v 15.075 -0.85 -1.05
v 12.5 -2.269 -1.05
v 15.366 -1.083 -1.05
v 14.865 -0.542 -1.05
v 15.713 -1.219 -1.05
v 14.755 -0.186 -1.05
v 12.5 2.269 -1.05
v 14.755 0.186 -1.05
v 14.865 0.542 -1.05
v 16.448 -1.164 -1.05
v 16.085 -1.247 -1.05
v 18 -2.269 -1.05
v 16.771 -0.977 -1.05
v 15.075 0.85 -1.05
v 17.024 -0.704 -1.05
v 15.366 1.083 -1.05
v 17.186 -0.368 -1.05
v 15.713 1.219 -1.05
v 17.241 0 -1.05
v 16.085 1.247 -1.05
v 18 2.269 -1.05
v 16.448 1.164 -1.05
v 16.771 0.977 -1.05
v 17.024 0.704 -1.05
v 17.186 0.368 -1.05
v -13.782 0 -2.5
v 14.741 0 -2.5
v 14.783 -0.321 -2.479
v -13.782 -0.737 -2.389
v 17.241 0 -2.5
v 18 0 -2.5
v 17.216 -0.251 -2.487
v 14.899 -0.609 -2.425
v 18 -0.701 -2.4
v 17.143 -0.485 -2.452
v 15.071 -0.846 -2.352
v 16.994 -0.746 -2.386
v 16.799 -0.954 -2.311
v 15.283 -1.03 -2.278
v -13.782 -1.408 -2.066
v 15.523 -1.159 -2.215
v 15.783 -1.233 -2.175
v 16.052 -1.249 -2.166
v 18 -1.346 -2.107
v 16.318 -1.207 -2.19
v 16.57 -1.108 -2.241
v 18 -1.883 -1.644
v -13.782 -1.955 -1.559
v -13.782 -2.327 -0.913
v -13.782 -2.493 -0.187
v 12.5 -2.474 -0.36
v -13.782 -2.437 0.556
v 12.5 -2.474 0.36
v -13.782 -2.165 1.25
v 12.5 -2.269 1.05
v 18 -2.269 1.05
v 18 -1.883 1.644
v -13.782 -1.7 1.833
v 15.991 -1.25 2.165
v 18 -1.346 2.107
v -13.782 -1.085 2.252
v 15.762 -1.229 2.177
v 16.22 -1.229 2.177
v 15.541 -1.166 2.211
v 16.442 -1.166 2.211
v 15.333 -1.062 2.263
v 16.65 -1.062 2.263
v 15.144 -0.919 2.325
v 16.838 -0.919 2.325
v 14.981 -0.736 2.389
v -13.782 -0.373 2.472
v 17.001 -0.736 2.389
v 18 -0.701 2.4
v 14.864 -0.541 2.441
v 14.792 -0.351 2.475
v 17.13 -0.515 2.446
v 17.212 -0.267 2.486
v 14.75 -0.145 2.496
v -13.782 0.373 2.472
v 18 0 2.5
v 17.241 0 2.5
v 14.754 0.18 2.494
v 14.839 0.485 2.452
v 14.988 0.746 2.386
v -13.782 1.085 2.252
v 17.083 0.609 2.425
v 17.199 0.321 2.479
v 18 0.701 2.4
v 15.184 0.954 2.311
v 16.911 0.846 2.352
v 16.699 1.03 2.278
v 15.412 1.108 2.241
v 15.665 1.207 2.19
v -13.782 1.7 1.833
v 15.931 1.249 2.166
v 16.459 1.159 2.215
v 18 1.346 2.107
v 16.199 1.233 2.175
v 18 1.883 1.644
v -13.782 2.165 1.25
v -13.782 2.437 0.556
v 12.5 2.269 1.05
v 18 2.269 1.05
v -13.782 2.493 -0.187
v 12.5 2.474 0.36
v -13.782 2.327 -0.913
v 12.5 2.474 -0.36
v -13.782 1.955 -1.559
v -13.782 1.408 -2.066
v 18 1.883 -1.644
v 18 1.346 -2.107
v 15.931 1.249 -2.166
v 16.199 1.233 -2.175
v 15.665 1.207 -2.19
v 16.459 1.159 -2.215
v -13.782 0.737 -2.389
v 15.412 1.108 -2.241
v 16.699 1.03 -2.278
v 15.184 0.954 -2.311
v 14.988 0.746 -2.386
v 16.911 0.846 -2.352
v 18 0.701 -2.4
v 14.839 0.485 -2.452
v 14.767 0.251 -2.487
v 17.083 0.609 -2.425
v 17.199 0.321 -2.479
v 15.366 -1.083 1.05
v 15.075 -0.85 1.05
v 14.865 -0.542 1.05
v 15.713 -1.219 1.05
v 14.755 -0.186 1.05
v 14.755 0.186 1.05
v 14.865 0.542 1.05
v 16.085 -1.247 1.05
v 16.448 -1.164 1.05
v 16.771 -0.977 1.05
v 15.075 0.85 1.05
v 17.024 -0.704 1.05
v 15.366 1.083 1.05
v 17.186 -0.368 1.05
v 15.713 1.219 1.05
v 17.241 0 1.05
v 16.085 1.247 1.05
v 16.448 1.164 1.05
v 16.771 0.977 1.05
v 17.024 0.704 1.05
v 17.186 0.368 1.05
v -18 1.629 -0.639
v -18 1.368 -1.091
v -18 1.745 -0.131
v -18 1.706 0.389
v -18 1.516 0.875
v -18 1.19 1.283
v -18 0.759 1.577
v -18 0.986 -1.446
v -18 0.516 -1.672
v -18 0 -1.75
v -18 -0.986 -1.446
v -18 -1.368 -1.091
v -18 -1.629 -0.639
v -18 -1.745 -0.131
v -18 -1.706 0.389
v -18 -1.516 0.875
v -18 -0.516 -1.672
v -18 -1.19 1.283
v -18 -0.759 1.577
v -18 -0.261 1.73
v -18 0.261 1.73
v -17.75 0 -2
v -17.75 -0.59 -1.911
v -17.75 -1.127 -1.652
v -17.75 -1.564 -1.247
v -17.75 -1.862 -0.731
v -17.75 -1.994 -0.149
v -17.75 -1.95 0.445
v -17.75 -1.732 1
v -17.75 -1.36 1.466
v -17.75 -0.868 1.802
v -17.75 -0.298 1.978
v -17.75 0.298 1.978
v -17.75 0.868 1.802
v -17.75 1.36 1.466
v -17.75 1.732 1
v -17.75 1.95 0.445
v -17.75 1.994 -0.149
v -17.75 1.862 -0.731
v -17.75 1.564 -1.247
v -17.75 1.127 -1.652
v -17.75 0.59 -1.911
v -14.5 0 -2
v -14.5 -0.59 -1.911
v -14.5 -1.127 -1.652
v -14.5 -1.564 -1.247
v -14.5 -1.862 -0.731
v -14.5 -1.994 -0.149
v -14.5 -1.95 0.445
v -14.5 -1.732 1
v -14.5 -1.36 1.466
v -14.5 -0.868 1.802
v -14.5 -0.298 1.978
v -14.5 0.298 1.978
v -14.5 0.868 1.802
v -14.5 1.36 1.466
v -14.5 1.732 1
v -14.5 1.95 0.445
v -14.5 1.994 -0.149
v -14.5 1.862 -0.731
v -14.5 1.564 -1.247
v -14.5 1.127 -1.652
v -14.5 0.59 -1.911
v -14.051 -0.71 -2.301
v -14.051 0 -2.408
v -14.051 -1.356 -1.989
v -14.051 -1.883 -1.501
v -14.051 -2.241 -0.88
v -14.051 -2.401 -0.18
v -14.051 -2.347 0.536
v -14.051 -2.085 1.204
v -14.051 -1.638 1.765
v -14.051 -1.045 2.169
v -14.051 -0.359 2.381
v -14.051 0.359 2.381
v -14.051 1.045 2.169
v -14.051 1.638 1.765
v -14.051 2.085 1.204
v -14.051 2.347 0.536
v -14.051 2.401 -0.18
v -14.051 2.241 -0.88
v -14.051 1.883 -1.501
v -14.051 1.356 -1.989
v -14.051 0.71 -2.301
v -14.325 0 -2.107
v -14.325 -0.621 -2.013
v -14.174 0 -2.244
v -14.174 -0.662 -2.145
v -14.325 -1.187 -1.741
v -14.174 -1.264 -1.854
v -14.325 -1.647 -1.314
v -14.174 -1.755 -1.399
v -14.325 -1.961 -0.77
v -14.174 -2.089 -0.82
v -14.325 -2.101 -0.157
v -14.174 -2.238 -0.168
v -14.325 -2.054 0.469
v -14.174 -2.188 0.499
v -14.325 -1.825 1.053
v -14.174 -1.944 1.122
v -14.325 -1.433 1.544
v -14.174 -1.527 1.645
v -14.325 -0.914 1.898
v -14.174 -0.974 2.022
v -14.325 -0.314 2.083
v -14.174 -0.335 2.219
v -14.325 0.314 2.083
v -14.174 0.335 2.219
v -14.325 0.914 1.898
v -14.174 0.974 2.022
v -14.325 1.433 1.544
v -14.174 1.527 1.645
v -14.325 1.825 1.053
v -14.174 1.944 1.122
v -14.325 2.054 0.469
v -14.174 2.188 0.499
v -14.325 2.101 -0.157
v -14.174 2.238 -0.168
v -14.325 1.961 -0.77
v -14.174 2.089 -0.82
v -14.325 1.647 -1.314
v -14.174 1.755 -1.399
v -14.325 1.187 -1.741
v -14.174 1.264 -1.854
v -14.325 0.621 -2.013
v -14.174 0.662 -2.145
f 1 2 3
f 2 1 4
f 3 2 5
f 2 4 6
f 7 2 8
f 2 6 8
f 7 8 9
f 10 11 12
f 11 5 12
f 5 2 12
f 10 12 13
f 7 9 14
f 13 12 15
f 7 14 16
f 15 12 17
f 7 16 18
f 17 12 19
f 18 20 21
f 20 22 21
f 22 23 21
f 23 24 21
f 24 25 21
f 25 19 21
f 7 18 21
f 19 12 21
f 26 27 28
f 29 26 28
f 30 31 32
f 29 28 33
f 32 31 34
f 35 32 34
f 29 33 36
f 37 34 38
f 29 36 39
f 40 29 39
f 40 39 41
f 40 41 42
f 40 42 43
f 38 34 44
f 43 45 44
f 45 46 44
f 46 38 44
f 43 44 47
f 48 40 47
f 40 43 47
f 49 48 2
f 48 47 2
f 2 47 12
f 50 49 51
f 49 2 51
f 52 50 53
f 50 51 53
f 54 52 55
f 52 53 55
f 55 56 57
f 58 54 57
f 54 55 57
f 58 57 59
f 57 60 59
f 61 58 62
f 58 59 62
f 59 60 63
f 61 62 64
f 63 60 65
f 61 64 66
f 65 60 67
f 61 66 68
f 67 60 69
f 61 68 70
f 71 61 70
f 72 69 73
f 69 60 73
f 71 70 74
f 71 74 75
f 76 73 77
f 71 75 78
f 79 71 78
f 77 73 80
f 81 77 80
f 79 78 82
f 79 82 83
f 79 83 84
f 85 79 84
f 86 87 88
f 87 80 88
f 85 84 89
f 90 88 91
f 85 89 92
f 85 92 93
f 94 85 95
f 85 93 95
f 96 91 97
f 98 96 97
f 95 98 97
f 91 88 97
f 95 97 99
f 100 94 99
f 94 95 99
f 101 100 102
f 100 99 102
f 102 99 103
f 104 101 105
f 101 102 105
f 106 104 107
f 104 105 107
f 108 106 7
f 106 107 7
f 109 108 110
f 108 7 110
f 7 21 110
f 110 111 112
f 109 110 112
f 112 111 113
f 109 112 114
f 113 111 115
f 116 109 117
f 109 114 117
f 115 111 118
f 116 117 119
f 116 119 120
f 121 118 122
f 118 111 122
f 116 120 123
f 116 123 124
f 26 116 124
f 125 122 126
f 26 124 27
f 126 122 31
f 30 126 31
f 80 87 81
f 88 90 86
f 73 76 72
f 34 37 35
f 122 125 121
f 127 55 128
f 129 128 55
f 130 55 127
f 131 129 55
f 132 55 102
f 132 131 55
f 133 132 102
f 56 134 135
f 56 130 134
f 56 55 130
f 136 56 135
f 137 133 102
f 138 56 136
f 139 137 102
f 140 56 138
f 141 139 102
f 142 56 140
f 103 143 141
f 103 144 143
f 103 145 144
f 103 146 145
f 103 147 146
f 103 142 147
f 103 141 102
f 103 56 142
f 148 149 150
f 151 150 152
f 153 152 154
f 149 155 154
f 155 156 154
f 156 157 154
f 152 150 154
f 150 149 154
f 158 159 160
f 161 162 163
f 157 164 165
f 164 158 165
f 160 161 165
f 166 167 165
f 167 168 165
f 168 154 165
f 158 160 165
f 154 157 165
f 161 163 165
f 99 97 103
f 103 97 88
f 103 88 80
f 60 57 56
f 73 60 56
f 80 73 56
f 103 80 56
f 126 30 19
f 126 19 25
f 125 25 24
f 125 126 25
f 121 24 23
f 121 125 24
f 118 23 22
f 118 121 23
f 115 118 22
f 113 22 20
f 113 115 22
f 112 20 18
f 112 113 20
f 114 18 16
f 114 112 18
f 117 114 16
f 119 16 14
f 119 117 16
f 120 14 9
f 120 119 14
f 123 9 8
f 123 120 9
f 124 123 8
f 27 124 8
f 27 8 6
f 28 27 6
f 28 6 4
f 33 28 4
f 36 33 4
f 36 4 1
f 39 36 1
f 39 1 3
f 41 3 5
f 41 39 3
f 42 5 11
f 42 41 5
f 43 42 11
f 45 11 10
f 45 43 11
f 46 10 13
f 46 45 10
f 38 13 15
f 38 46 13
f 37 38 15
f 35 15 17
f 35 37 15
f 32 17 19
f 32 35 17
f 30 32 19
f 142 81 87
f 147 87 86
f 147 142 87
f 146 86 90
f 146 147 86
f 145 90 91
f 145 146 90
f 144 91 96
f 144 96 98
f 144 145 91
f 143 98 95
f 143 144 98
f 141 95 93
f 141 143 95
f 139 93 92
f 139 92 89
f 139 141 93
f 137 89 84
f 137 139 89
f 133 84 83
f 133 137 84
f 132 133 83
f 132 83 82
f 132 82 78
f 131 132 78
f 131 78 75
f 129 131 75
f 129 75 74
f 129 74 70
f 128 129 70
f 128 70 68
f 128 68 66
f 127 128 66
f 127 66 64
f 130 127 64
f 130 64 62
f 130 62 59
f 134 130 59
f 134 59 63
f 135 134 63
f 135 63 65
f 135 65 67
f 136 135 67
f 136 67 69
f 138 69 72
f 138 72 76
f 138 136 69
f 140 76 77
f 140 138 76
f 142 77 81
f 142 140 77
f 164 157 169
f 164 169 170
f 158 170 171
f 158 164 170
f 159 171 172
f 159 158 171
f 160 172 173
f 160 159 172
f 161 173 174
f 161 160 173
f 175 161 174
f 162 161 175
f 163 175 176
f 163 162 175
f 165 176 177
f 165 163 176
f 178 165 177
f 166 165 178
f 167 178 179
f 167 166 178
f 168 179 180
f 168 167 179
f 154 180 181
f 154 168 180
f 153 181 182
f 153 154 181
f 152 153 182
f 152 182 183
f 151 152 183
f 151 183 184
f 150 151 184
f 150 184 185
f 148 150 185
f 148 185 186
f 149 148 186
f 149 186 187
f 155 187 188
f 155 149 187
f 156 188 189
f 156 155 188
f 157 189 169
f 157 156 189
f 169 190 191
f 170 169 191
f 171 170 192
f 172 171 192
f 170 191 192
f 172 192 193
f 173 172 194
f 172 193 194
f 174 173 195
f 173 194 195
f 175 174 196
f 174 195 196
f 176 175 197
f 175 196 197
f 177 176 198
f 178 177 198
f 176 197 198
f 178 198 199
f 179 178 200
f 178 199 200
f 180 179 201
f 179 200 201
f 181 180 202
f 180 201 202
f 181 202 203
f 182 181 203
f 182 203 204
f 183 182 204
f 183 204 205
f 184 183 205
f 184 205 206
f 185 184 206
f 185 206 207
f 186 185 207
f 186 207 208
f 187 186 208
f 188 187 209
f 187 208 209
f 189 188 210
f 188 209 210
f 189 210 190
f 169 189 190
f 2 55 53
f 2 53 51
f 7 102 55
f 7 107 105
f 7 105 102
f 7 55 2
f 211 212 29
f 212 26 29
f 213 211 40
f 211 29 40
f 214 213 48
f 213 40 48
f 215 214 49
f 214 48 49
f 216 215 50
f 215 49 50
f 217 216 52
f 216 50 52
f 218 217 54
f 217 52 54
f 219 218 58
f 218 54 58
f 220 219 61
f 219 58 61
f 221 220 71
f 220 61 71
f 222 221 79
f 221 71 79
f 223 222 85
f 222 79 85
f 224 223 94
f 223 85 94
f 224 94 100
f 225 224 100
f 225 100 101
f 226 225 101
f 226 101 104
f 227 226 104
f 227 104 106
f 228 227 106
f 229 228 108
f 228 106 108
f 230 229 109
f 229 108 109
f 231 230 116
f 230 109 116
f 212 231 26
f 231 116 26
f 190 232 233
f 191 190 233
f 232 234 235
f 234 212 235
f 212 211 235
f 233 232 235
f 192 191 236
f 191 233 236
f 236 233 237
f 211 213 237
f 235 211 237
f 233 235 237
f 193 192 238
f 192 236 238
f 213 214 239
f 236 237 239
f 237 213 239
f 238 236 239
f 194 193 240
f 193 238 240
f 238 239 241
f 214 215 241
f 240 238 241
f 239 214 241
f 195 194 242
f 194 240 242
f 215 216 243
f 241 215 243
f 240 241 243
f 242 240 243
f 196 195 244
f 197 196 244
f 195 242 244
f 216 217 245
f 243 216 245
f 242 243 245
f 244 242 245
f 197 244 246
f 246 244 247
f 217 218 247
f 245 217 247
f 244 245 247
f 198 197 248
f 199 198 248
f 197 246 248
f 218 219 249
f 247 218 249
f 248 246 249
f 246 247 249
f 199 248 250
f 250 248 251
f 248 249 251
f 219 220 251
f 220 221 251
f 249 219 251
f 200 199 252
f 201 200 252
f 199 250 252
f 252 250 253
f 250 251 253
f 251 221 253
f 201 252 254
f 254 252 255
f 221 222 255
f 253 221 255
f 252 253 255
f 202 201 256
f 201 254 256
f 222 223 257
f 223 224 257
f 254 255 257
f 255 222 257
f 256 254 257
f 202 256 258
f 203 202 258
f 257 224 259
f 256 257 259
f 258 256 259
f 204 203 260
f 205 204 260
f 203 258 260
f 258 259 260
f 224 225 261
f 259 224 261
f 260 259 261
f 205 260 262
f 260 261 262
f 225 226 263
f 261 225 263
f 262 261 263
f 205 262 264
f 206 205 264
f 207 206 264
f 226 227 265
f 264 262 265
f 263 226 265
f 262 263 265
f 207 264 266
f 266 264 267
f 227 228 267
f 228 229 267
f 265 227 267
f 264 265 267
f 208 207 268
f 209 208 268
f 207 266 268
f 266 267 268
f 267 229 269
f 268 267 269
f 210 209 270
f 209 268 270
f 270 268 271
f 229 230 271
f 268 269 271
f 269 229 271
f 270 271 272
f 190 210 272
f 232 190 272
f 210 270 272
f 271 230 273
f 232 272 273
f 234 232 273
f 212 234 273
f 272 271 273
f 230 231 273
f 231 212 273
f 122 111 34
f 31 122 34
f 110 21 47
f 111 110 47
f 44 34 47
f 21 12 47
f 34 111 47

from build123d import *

# Parameters (mm, degrees)
SKETCH2_W               = 2.1
SKETCH2_H               = 5.824035358
CUT_EXTRUDE1_DEPTH      = 5.5
CUT_EXTRUDE2_DEPTH      = 19.516276624
CUT_EXTRUDE2_DEPTH_BACK = 19.516276624
SKETCH3_R               = 1.25
CHAMFER1_SIZE           = 0.25
CHAMFER2_SIZE           = 0.218100459


with BuildPart() as part:
    # Sketch1 → Revolve1 (revolve)
    with BuildSketch(Plane.XY, mode=Mode.PRIVATE) as revolve1_sk:
        with BuildLine():
            Line((-18, 2), (-14.5, 2))
            ThreePointArc((-14.5, 2), (-14.208348655, 2.208348655), (-14, 2.5))
            Line((-14, 2.5), (18, 2.5))
            Line((18, 2.5), (18, 0))
            Line((18, 0), (-18, 0))
            Line((-18, 0), (-18, 2))
        make_face()
    revolve(revolve1_sk.sketch.rotate(Axis((18, 0, 0), (-1, 0, 0)), 90), axis=Axis((18, 0, 0), (-1, 0, 0)))

    # Sketch2 → Cut-Extrude1 (cut)
    with BuildSketch(Plane(origin=(18, 0, 0), x_dir=(0, 0, -1), z_dir=(1, 0, 0))):
        Rectangle(SKETCH2_W, SKETCH2_H)
    extrude(amount=-CUT_EXTRUDE1_DEPTH, mode=Mode.SUBTRACT)

    # Sketch3 → Cut-Extrude2 (cut, two sides: drawn at the far end of the back side and taken through both)
    with BuildSketch(Plane.XY.offset(-1.05).offset(-CUT_EXTRUDE2_DEPTH_BACK)):
        with Locations((15.991222224, 0)):
            Circle(SKETCH3_R)
    extrude(amount=CUT_EXTRUDE2_DEPTH + CUT_EXTRUDE2_DEPTH_BACK, mode=Mode.SUBTRACT)

    # Chamfer1
    chamfer1_edges = [part.edges().sort_by_distance(p)[0] for p in [
        (-18, 0, 2),
    ]]
    chamfer(chamfer1_edges, length=CHAMFER1_SIZE)

    # Chamfer2
    # the kernel refuses this chamfer: 0.218100459, 0.1 mm, written as the material it takes off along each edge
    with BuildSketch(Plane(origin=(-14, 0, 0), x_dir=(0, 0, -1), z_dir=(0, 1, 0))) as chamfer2_piece_1:
        with BuildLine():
            Line((2.407857149, 0.050754033), (2.5, -CHAMFER2_SIZE * 0.99999999787))
            Line((2.5, -CHAMFER2_SIZE * 0.99999999787), (2.5, 0))
            ThreePointArc((2.5, 0), (2.450478775, 0.025833705), (2.407857149, 0.050754033))
        make_face()
    revolve(axis=Axis((-14, 0, 0), (-1, 0, 0)), mode=Mode.SUBTRACT)


solid = part.part
